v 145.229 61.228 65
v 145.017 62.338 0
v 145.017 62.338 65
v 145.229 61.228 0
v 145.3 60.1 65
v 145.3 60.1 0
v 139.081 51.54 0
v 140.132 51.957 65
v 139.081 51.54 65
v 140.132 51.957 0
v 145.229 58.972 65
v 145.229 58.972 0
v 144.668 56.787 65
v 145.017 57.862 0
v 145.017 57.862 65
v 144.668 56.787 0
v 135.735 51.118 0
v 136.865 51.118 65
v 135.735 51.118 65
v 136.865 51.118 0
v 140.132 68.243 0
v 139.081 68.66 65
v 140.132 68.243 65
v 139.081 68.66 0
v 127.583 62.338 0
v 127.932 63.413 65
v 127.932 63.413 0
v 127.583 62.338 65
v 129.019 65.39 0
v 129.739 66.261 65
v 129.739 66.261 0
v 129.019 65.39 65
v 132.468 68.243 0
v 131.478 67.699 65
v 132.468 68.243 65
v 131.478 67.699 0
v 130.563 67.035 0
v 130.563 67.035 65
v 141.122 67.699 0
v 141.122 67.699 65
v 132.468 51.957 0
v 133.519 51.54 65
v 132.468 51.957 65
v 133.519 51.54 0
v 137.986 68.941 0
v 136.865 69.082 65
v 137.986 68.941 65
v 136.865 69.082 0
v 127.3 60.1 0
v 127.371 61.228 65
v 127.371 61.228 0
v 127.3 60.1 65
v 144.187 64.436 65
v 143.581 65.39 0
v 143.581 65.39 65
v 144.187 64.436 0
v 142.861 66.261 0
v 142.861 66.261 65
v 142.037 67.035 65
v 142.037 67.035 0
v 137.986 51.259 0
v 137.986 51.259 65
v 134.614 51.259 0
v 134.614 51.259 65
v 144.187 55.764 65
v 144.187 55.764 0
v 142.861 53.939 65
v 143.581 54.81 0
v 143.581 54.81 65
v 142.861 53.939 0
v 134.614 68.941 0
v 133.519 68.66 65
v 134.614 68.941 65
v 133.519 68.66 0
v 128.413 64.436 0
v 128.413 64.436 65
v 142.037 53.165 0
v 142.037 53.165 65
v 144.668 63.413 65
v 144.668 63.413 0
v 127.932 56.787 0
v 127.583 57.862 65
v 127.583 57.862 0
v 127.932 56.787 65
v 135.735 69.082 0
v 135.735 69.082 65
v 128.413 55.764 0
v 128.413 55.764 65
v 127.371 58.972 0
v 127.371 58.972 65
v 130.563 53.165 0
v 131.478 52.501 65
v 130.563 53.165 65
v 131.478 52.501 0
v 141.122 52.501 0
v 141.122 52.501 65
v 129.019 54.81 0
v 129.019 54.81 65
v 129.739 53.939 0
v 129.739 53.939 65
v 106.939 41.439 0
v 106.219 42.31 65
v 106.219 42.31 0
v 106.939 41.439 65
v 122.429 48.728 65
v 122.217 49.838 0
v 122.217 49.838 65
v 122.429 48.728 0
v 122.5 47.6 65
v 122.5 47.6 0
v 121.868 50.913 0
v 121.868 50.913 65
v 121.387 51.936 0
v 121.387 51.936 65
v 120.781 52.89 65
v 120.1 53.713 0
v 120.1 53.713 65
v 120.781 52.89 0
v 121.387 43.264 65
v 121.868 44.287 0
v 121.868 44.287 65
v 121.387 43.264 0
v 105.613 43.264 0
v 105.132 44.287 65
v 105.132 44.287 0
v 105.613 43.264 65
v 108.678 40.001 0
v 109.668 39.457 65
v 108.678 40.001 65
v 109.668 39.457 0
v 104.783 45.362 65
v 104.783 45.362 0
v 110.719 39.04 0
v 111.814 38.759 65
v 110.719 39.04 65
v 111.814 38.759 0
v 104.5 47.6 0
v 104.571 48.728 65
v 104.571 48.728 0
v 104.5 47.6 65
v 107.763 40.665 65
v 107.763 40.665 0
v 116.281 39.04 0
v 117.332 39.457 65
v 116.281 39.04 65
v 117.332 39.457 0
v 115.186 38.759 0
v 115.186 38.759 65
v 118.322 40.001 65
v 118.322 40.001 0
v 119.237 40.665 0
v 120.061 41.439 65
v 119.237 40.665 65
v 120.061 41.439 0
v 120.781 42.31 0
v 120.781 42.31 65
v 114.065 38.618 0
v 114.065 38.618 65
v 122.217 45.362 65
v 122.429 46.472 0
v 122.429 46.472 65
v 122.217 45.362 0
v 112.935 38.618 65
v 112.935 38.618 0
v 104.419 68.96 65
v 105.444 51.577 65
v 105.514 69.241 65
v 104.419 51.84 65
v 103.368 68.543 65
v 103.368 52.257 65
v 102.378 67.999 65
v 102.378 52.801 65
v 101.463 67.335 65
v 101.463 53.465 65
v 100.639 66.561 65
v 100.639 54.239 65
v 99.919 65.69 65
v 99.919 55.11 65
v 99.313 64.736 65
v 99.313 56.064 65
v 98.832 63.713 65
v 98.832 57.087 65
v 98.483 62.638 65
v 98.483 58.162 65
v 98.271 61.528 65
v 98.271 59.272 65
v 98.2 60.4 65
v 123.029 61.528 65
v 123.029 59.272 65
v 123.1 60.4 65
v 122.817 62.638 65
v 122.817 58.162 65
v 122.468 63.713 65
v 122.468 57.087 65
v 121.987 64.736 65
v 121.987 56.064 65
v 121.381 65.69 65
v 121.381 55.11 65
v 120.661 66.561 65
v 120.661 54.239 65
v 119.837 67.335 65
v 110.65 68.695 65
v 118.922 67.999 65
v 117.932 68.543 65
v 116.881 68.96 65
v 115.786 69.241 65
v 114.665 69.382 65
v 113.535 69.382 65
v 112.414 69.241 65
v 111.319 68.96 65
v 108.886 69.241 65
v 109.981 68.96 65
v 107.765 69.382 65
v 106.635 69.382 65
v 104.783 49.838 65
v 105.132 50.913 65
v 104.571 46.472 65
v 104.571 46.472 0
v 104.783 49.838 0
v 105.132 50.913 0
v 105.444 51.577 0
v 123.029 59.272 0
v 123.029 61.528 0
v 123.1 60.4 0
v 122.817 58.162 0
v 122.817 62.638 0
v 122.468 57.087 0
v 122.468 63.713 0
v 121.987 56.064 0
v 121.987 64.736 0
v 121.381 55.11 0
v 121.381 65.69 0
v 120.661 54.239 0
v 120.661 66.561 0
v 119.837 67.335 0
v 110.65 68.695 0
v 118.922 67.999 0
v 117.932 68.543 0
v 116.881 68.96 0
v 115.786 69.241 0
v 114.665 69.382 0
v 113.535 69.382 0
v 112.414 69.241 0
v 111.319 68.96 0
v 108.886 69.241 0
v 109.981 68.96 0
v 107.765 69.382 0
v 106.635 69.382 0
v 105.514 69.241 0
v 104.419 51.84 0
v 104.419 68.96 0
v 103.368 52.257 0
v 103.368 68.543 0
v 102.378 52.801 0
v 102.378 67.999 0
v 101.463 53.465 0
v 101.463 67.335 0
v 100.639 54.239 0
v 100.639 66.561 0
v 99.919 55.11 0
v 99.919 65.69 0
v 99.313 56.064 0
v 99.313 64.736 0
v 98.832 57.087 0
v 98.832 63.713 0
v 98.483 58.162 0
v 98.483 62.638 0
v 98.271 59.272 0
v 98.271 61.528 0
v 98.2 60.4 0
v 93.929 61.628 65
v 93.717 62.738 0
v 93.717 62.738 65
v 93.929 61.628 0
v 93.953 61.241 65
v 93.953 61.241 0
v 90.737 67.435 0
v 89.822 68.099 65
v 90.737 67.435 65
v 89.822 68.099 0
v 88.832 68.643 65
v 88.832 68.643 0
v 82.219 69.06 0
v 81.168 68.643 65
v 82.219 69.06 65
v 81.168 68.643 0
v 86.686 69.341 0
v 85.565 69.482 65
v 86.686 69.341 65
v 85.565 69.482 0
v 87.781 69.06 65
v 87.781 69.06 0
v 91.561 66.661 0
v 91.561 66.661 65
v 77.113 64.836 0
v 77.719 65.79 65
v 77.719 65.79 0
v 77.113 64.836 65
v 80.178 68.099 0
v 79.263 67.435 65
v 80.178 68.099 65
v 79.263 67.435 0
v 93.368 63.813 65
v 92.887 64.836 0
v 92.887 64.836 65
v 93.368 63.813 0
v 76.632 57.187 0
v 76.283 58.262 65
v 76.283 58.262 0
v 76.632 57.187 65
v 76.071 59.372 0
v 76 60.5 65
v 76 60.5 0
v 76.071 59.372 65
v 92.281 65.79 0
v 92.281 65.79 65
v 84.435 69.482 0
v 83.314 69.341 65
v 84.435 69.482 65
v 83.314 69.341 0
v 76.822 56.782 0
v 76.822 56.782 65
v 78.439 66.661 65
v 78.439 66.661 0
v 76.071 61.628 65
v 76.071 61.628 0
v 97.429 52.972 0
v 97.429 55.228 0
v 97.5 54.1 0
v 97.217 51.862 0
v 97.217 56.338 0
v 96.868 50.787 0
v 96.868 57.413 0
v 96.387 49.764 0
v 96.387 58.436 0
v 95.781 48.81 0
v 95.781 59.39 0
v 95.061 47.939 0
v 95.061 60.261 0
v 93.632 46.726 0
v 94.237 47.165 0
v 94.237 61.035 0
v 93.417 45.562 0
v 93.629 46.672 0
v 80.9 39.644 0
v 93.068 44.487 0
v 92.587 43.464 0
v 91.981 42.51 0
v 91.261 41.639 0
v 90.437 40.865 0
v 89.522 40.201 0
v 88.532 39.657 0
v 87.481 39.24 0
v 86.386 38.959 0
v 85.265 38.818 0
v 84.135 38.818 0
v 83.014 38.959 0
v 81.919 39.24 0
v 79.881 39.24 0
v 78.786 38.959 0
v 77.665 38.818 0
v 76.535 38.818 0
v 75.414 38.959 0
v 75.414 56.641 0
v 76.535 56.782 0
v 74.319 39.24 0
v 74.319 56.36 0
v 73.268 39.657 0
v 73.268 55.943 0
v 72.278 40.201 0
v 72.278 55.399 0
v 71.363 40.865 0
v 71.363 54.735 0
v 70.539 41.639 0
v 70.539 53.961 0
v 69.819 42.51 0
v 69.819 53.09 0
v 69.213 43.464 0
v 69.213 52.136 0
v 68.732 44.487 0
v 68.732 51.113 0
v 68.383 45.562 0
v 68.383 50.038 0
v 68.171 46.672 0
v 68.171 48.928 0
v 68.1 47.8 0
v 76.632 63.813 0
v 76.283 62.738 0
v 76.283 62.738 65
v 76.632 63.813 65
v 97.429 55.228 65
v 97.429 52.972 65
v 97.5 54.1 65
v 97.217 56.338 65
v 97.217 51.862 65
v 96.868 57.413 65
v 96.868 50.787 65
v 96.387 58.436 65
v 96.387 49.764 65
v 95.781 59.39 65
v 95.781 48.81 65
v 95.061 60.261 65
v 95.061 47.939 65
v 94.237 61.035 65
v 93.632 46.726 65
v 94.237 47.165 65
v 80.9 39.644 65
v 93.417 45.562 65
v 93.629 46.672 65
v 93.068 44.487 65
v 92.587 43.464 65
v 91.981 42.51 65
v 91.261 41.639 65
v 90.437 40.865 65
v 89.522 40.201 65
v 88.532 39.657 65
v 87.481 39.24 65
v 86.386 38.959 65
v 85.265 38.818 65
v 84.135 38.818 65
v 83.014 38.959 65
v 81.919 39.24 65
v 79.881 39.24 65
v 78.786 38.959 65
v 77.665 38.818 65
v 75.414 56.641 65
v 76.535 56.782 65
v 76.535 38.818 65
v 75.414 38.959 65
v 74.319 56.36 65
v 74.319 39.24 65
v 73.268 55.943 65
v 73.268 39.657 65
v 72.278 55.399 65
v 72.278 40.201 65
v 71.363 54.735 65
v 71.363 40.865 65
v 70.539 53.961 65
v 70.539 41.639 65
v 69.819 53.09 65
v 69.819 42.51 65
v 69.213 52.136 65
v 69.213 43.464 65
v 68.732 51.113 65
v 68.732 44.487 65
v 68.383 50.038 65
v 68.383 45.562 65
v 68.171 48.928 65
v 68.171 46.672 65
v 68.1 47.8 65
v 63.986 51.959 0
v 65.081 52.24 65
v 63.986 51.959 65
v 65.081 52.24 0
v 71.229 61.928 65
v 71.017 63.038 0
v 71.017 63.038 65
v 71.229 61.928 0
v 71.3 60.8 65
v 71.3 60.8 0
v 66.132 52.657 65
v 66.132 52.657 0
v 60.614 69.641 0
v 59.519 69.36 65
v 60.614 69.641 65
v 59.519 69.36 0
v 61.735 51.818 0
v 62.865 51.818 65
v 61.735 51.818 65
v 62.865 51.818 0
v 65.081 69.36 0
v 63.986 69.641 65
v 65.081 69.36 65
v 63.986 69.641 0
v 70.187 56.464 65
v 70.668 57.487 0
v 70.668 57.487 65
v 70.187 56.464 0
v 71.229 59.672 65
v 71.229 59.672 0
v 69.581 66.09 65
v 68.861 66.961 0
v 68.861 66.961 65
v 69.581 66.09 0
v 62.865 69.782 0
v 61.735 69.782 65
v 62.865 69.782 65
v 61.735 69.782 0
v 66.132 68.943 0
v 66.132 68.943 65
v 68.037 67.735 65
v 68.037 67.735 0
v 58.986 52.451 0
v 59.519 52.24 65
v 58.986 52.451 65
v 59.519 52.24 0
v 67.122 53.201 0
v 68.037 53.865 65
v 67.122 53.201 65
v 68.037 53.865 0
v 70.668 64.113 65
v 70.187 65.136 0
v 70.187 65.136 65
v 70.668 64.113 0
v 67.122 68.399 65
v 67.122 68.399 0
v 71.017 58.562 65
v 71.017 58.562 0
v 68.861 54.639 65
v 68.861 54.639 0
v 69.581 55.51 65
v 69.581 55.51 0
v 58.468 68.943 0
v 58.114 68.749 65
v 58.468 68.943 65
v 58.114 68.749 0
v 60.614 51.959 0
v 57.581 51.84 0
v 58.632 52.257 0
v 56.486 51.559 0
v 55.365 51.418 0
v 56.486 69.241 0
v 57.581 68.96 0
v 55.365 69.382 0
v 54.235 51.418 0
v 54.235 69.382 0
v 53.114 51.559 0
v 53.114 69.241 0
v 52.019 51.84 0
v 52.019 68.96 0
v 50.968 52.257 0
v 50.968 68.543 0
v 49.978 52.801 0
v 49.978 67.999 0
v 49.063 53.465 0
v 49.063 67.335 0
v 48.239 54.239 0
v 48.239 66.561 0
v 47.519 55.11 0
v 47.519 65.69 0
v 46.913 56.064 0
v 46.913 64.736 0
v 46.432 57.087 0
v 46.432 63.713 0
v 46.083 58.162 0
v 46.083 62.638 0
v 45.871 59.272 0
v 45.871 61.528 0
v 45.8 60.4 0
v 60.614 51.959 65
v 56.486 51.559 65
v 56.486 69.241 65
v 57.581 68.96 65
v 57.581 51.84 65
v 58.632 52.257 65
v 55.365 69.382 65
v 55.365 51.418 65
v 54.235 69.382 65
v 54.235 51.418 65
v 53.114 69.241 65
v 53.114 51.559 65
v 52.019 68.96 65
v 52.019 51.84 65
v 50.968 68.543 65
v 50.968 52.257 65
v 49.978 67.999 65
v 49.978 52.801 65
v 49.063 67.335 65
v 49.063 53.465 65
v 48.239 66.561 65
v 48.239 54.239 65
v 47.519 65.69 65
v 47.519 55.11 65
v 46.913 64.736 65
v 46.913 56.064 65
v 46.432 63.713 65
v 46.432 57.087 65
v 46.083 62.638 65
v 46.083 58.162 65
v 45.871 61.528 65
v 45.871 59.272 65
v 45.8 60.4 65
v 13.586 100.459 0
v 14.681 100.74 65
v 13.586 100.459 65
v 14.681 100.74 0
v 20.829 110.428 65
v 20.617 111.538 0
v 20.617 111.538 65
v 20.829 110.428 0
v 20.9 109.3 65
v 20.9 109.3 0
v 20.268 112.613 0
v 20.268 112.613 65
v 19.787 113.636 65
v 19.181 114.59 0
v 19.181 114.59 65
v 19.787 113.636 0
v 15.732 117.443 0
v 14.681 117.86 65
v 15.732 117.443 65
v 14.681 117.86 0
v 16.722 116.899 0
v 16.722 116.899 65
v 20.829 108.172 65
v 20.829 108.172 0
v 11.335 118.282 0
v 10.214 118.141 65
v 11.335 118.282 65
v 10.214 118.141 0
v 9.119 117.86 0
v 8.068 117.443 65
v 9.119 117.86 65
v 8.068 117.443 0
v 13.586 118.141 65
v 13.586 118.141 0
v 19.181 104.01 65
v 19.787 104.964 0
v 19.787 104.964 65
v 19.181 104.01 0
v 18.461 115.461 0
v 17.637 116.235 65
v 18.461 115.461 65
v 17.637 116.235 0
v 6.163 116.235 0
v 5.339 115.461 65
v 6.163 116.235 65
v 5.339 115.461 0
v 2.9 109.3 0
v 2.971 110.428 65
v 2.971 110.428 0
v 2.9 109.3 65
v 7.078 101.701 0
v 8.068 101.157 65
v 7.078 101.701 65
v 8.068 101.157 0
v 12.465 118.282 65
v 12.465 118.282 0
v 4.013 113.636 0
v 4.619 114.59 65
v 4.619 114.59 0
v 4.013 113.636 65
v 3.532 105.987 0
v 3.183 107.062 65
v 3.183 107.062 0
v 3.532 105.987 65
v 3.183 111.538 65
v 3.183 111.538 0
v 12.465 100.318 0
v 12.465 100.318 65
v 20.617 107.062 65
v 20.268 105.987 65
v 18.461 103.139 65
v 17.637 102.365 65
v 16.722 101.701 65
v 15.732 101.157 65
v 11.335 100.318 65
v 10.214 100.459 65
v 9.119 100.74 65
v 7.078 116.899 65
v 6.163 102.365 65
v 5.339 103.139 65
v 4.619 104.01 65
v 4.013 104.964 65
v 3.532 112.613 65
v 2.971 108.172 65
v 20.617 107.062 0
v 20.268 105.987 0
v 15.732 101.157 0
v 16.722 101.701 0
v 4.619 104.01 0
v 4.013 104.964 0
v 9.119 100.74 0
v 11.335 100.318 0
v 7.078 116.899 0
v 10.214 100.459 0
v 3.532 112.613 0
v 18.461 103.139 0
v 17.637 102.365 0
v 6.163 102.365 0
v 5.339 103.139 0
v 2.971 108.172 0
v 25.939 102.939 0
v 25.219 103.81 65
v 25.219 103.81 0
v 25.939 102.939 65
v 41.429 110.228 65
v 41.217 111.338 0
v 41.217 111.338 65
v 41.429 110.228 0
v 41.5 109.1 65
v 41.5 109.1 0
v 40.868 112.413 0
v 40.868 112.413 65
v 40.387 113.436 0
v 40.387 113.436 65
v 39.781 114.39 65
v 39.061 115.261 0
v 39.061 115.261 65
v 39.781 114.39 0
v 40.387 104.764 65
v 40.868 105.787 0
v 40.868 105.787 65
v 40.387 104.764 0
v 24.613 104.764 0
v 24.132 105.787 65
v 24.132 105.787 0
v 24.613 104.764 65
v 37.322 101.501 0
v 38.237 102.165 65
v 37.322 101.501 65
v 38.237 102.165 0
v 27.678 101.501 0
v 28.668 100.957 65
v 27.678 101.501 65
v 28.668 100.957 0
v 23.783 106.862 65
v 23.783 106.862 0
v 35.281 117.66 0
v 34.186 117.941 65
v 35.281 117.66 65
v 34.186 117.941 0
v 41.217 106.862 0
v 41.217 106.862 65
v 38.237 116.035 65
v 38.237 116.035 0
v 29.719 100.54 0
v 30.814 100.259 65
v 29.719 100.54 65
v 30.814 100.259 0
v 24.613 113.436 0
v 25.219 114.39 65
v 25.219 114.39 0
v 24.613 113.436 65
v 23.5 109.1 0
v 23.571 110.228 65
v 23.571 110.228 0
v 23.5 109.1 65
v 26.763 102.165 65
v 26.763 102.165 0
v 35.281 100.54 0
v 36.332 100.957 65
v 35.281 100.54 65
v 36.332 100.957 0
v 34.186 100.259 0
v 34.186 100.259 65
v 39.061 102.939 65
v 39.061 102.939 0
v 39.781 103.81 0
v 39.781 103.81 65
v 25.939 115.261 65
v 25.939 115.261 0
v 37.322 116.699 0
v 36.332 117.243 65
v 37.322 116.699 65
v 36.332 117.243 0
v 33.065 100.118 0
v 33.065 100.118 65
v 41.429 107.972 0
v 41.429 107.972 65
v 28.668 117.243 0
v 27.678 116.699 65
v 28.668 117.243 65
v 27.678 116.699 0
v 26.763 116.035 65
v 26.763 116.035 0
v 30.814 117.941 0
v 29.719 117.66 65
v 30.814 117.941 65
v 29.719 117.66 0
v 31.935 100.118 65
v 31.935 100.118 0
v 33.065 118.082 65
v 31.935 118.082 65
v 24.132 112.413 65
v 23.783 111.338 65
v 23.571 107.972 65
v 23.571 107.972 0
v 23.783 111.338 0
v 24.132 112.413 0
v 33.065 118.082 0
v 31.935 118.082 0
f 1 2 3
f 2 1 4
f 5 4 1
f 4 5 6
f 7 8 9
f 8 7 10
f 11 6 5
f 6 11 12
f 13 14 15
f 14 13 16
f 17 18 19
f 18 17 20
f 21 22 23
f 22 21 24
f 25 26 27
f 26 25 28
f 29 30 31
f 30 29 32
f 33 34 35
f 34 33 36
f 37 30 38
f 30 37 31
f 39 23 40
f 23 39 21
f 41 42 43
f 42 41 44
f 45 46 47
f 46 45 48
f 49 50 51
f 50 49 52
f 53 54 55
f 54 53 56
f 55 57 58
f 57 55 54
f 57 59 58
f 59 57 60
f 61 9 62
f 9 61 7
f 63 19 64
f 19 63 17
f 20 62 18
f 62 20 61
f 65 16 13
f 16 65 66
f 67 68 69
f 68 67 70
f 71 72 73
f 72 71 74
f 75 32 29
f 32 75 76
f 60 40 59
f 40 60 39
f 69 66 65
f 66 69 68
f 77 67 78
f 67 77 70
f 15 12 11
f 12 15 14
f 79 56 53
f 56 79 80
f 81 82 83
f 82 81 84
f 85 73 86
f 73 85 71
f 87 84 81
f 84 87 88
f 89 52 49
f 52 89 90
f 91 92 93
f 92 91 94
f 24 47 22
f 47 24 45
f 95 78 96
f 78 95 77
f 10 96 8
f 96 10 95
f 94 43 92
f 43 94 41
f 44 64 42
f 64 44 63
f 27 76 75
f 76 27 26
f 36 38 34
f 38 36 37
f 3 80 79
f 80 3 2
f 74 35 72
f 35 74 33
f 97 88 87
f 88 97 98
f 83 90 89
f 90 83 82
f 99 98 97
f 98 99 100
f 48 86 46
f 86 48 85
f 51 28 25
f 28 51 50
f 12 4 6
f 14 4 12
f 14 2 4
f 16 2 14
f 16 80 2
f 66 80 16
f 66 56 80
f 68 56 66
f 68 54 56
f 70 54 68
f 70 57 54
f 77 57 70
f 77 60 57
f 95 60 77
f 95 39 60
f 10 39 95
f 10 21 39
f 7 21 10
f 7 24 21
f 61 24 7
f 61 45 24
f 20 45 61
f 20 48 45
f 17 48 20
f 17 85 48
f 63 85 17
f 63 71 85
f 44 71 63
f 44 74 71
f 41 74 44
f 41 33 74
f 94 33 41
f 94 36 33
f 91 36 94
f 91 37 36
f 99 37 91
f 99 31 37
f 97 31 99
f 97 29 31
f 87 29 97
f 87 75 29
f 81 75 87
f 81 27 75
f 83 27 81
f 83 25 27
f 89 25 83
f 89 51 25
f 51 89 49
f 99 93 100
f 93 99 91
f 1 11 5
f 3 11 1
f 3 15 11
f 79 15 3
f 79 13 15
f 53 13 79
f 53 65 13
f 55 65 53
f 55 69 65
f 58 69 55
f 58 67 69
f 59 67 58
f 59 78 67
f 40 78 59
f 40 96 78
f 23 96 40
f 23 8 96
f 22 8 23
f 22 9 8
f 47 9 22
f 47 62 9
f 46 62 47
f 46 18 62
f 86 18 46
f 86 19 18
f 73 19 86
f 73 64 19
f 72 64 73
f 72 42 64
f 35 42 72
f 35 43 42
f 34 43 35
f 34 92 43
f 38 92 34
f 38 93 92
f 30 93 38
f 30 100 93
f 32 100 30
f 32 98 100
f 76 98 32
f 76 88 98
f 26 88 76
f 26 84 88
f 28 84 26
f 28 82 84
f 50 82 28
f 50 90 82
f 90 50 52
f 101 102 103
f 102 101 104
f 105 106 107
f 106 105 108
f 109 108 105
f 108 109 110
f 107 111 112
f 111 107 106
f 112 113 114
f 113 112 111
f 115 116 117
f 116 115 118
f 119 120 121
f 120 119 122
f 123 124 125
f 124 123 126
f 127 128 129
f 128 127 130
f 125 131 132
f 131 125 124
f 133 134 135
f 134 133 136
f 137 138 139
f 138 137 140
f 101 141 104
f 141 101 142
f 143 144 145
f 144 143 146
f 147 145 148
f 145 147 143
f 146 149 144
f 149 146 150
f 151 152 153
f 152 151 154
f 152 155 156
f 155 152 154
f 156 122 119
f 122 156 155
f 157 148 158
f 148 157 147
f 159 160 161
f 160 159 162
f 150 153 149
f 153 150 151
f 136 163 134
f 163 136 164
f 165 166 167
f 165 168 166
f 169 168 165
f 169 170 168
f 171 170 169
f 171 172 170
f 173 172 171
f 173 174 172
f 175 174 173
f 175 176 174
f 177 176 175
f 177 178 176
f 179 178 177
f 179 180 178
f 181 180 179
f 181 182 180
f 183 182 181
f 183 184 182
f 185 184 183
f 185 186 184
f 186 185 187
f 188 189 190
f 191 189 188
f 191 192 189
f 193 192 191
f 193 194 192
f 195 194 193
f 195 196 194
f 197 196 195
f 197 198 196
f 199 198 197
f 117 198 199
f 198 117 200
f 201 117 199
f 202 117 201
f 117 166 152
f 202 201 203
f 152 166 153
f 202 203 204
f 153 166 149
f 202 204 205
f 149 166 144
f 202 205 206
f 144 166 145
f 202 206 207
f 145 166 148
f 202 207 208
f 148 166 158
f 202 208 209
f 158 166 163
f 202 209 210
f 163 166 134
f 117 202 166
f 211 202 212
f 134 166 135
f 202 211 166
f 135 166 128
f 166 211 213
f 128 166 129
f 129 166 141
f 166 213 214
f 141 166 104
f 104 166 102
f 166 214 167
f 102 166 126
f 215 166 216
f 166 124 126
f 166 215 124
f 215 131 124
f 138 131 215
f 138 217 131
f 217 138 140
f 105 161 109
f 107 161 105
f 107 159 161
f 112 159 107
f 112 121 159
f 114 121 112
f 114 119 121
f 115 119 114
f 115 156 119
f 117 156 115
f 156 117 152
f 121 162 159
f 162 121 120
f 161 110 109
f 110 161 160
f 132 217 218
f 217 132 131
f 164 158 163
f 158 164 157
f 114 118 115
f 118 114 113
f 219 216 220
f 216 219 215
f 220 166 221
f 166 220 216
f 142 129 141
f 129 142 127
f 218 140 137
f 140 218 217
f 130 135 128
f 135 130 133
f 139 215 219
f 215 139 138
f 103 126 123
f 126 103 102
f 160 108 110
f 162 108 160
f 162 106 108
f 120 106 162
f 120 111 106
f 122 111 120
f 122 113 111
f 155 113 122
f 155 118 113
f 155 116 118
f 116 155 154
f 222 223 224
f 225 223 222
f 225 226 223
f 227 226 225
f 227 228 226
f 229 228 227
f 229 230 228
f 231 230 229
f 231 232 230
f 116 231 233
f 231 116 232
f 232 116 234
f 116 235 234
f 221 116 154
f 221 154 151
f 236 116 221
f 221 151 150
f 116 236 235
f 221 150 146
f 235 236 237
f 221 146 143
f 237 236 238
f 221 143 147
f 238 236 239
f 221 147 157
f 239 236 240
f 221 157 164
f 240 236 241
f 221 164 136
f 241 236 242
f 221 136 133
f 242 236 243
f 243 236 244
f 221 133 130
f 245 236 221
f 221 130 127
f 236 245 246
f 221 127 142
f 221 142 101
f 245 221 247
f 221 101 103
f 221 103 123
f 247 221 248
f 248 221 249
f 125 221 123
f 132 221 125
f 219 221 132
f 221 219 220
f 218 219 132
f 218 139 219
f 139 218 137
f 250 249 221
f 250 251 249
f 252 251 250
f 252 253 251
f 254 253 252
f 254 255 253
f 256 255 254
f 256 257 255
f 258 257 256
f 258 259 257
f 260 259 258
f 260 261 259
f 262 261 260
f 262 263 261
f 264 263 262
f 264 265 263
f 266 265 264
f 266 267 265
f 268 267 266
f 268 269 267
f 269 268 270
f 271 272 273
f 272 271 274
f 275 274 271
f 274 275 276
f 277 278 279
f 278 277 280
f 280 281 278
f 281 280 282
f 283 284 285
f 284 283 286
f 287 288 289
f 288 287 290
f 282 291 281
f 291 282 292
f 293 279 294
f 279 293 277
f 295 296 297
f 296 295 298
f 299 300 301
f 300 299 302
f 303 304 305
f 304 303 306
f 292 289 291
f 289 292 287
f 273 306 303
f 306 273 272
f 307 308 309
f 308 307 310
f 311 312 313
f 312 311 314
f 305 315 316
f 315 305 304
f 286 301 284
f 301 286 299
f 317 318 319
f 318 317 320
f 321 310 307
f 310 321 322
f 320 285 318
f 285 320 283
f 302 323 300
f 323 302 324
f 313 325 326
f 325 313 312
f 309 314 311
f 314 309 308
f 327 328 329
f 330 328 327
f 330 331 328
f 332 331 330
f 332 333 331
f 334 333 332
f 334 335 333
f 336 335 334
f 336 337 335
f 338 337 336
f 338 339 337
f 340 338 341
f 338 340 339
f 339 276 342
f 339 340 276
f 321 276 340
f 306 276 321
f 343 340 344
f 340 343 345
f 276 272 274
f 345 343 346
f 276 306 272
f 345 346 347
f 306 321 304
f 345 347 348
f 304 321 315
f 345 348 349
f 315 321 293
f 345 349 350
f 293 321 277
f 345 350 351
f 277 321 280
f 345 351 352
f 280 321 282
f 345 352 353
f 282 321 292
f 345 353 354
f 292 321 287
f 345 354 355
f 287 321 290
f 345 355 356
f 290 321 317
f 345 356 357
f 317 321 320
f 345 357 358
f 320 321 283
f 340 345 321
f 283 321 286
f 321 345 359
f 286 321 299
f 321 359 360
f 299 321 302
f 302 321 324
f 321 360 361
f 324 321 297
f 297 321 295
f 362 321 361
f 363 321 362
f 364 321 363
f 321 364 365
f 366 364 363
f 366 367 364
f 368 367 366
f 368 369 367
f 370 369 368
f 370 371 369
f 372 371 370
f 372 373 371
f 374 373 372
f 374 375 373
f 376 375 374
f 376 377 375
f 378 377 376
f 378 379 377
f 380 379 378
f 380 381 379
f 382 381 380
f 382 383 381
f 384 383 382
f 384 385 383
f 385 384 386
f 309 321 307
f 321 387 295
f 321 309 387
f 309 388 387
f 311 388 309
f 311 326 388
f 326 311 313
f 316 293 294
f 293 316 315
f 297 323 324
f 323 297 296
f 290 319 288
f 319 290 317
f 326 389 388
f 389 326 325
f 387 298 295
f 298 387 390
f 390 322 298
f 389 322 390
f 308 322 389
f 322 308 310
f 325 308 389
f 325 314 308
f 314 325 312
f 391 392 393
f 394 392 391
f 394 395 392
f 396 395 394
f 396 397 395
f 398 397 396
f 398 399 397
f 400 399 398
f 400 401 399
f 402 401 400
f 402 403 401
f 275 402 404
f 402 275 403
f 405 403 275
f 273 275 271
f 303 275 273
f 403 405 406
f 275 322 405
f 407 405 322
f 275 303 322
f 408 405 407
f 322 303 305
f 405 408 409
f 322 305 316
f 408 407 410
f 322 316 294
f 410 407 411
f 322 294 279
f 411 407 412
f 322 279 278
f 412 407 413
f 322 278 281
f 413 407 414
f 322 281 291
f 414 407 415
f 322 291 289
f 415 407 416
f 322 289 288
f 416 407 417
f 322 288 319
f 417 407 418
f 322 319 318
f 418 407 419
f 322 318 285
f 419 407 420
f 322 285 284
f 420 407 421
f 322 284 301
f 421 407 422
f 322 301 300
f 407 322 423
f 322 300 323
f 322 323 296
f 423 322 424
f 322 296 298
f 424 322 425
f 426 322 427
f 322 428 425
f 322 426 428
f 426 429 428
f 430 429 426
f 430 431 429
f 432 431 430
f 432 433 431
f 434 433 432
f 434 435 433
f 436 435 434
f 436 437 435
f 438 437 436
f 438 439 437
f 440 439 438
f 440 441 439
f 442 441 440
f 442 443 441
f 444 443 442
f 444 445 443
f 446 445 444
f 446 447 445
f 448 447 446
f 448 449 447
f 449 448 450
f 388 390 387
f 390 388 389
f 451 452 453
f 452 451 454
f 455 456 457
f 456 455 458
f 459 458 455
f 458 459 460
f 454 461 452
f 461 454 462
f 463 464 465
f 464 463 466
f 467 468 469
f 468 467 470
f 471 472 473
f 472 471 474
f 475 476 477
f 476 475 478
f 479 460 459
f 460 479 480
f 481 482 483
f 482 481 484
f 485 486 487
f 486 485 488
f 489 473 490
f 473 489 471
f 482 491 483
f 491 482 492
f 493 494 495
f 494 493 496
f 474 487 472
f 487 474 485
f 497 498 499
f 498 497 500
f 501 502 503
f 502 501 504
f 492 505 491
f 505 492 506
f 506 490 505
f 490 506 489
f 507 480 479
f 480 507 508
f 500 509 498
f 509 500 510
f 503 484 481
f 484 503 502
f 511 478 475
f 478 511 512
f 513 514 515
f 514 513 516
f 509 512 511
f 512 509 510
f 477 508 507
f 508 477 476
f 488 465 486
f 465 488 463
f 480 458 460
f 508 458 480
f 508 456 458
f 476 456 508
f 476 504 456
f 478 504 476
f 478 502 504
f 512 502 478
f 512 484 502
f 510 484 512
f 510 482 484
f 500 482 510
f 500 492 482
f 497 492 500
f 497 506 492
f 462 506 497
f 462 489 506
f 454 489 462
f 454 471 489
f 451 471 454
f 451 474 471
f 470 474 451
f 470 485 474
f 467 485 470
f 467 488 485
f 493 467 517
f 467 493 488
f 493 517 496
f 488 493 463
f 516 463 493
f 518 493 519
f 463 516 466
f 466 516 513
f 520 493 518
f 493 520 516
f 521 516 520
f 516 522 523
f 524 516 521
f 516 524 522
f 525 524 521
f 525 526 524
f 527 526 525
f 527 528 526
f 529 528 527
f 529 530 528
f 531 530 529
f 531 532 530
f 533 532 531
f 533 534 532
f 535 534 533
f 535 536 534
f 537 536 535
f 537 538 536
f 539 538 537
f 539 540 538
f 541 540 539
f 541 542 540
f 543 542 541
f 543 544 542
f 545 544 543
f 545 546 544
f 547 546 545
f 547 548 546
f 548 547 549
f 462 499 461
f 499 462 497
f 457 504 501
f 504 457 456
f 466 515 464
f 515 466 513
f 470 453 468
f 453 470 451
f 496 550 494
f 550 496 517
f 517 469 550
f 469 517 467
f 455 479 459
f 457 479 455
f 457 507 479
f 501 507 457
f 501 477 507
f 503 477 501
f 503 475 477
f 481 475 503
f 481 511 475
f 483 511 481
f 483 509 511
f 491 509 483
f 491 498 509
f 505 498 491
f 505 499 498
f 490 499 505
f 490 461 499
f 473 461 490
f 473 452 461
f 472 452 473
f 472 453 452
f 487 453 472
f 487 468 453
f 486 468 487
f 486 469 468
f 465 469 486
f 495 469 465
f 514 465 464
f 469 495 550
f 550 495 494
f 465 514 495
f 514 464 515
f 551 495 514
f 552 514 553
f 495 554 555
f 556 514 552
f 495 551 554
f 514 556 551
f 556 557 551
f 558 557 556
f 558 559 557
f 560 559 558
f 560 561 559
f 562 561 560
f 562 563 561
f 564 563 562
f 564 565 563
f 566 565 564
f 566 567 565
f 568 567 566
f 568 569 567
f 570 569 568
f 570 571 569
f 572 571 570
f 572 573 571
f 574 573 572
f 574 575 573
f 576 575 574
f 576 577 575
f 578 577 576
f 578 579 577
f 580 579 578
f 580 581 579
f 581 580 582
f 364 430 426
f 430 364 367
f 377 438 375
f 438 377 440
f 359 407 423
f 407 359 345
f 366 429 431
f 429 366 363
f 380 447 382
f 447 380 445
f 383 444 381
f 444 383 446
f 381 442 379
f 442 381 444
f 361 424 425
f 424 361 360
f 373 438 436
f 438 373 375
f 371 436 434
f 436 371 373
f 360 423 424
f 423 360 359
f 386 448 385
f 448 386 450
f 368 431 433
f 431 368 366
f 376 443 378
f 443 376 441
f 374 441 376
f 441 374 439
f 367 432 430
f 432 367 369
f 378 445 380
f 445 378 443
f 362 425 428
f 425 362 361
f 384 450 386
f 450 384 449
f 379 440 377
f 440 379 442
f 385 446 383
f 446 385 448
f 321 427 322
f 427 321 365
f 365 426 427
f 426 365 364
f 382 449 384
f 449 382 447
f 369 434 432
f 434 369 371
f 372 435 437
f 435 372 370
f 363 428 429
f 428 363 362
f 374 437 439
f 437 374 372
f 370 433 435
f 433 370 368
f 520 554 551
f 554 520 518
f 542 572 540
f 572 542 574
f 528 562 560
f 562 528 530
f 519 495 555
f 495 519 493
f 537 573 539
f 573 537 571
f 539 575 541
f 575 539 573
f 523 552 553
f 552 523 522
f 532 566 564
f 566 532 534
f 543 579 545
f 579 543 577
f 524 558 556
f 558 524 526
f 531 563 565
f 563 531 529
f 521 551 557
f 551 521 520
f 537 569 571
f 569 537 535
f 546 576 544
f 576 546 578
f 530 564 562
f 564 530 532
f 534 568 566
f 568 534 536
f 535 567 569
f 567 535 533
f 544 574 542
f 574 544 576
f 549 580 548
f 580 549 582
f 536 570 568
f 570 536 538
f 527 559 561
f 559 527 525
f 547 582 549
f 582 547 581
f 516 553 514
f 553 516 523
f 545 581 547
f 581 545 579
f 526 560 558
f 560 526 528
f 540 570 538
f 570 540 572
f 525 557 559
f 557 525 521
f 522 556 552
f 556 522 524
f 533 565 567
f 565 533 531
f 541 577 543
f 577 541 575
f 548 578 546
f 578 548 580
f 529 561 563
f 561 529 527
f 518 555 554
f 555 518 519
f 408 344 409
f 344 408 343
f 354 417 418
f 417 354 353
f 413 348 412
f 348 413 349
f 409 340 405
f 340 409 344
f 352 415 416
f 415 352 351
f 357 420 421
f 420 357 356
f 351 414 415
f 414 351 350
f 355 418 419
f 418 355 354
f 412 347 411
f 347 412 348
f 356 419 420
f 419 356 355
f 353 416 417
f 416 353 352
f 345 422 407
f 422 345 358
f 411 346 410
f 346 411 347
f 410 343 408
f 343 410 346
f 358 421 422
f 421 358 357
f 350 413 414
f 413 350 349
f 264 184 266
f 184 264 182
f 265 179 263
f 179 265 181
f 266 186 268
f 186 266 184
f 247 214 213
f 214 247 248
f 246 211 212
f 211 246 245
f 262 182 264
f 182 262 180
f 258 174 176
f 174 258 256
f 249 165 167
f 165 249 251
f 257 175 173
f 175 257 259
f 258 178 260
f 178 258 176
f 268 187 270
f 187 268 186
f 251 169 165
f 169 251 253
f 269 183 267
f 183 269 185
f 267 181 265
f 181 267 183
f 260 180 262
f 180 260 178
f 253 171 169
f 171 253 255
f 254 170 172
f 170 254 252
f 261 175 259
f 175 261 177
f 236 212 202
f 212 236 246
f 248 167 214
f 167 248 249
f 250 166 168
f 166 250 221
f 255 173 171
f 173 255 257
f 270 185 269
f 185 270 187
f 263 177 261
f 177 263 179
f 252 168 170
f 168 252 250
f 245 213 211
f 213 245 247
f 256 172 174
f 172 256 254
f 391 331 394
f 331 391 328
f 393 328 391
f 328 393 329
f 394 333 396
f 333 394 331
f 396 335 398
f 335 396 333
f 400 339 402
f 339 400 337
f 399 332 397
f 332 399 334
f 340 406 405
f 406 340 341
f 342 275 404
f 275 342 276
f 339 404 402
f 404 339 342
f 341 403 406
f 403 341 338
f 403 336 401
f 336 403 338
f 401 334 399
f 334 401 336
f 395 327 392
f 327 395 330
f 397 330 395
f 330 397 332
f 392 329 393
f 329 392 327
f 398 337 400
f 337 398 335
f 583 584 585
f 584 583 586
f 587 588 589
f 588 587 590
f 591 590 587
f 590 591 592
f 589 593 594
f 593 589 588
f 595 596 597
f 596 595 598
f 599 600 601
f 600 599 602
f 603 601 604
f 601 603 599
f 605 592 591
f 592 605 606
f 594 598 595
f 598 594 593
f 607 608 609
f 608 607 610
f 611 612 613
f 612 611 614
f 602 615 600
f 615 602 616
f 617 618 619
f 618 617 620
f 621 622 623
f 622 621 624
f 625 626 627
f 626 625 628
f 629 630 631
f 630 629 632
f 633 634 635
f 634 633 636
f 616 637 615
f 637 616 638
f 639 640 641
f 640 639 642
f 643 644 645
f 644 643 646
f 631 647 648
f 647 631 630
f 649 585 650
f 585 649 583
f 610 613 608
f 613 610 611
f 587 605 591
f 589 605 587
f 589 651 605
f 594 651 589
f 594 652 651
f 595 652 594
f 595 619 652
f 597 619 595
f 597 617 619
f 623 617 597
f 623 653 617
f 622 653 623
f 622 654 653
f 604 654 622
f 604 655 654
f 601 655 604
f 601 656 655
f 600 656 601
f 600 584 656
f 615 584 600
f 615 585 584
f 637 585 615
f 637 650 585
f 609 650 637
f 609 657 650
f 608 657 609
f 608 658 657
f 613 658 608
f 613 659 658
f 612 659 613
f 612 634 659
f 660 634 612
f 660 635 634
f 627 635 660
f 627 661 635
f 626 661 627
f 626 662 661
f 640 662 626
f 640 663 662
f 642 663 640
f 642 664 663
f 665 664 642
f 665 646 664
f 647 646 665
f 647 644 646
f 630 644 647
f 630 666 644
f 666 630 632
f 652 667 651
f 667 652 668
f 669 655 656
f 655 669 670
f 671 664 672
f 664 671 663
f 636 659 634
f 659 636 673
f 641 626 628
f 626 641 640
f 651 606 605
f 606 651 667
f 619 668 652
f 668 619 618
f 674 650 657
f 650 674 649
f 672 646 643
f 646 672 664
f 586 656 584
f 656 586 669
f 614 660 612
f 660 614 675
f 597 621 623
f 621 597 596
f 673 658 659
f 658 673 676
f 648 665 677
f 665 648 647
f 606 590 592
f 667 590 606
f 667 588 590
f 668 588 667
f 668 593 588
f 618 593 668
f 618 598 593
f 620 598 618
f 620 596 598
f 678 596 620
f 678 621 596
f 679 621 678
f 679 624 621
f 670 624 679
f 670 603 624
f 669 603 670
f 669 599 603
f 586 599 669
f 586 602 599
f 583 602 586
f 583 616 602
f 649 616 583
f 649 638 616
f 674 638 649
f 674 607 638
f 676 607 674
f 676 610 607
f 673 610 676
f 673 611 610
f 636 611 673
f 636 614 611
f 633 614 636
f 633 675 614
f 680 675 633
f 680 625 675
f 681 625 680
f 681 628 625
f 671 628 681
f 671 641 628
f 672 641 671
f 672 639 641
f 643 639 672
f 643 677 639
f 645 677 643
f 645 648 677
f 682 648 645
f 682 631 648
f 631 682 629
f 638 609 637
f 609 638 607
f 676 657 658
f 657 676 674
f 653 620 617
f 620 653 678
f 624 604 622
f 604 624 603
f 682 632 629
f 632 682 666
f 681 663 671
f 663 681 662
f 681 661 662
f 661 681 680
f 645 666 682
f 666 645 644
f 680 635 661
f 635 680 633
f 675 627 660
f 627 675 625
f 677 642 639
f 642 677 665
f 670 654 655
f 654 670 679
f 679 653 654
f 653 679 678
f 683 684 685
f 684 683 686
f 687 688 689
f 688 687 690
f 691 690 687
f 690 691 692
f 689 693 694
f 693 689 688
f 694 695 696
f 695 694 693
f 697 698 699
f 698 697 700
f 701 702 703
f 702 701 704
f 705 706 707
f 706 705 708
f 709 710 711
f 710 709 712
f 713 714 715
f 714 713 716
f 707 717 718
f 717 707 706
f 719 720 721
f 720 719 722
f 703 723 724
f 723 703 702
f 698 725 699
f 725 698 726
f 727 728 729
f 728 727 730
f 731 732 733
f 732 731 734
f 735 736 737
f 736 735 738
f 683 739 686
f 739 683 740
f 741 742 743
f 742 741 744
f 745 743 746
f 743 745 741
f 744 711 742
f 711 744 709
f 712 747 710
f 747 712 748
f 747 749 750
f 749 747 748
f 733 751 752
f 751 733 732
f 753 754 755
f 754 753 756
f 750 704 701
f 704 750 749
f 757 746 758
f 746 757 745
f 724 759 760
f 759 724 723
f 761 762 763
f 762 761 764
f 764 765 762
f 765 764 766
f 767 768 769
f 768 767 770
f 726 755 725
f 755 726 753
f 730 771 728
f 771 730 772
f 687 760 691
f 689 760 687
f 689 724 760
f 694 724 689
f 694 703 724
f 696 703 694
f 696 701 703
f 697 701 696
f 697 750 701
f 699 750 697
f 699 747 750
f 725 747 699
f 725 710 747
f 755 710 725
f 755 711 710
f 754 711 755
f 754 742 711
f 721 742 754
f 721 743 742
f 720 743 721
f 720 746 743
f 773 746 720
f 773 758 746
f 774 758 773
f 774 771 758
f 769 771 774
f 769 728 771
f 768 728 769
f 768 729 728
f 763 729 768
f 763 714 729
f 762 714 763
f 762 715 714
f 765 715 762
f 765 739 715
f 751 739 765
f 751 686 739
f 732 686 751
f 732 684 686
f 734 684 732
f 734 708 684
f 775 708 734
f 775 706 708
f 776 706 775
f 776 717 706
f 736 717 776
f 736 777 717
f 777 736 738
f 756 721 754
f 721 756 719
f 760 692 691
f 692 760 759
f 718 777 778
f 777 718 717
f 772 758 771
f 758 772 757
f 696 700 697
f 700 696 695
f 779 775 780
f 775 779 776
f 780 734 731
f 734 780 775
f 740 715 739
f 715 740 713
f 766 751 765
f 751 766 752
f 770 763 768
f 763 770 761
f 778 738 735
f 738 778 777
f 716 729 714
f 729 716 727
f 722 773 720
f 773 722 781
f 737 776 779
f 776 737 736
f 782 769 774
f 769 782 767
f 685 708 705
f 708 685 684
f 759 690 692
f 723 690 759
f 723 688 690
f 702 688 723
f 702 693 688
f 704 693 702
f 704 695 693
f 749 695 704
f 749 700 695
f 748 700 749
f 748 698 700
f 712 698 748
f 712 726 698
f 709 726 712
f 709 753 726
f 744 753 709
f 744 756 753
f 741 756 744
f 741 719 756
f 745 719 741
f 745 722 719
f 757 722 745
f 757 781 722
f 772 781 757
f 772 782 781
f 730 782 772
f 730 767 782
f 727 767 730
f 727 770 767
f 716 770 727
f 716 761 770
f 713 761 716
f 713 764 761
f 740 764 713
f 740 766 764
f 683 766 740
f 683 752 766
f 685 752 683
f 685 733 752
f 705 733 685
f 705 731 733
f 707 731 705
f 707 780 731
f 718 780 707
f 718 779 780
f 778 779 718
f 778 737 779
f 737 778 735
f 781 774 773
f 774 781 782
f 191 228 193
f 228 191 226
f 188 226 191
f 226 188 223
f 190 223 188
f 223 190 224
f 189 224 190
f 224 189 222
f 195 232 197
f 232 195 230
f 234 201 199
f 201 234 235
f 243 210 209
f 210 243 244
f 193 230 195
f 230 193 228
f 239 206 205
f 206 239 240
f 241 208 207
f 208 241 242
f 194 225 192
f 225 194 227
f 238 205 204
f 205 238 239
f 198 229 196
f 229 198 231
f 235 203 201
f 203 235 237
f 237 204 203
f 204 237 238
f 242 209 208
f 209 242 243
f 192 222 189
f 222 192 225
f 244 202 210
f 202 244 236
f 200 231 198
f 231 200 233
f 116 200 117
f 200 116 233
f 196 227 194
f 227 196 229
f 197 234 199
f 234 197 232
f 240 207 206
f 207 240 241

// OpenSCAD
module battery(){cylinder(h=65, r=9, $fn=50);}
translate([136.3,60.1,0]) battery();
translate([113.5,47.6,0]) battery();
translate([85.0,60.5,0]) battery();
translate([62.3,60.8,0]) battery();
translate([77.1,47.8,0]) battery();
translate([54.8,60.4,0]) battery();
translate([84.7,47.8,0]) battery();
translate([107.2,60.4,0]) battery();
translate([88.5,54.1,0]) battery();
translate([11.9,109.3,0]) battery();
translate([32.5,109.1,0]) battery();
translate([114.1,60.4,0]) battery();
